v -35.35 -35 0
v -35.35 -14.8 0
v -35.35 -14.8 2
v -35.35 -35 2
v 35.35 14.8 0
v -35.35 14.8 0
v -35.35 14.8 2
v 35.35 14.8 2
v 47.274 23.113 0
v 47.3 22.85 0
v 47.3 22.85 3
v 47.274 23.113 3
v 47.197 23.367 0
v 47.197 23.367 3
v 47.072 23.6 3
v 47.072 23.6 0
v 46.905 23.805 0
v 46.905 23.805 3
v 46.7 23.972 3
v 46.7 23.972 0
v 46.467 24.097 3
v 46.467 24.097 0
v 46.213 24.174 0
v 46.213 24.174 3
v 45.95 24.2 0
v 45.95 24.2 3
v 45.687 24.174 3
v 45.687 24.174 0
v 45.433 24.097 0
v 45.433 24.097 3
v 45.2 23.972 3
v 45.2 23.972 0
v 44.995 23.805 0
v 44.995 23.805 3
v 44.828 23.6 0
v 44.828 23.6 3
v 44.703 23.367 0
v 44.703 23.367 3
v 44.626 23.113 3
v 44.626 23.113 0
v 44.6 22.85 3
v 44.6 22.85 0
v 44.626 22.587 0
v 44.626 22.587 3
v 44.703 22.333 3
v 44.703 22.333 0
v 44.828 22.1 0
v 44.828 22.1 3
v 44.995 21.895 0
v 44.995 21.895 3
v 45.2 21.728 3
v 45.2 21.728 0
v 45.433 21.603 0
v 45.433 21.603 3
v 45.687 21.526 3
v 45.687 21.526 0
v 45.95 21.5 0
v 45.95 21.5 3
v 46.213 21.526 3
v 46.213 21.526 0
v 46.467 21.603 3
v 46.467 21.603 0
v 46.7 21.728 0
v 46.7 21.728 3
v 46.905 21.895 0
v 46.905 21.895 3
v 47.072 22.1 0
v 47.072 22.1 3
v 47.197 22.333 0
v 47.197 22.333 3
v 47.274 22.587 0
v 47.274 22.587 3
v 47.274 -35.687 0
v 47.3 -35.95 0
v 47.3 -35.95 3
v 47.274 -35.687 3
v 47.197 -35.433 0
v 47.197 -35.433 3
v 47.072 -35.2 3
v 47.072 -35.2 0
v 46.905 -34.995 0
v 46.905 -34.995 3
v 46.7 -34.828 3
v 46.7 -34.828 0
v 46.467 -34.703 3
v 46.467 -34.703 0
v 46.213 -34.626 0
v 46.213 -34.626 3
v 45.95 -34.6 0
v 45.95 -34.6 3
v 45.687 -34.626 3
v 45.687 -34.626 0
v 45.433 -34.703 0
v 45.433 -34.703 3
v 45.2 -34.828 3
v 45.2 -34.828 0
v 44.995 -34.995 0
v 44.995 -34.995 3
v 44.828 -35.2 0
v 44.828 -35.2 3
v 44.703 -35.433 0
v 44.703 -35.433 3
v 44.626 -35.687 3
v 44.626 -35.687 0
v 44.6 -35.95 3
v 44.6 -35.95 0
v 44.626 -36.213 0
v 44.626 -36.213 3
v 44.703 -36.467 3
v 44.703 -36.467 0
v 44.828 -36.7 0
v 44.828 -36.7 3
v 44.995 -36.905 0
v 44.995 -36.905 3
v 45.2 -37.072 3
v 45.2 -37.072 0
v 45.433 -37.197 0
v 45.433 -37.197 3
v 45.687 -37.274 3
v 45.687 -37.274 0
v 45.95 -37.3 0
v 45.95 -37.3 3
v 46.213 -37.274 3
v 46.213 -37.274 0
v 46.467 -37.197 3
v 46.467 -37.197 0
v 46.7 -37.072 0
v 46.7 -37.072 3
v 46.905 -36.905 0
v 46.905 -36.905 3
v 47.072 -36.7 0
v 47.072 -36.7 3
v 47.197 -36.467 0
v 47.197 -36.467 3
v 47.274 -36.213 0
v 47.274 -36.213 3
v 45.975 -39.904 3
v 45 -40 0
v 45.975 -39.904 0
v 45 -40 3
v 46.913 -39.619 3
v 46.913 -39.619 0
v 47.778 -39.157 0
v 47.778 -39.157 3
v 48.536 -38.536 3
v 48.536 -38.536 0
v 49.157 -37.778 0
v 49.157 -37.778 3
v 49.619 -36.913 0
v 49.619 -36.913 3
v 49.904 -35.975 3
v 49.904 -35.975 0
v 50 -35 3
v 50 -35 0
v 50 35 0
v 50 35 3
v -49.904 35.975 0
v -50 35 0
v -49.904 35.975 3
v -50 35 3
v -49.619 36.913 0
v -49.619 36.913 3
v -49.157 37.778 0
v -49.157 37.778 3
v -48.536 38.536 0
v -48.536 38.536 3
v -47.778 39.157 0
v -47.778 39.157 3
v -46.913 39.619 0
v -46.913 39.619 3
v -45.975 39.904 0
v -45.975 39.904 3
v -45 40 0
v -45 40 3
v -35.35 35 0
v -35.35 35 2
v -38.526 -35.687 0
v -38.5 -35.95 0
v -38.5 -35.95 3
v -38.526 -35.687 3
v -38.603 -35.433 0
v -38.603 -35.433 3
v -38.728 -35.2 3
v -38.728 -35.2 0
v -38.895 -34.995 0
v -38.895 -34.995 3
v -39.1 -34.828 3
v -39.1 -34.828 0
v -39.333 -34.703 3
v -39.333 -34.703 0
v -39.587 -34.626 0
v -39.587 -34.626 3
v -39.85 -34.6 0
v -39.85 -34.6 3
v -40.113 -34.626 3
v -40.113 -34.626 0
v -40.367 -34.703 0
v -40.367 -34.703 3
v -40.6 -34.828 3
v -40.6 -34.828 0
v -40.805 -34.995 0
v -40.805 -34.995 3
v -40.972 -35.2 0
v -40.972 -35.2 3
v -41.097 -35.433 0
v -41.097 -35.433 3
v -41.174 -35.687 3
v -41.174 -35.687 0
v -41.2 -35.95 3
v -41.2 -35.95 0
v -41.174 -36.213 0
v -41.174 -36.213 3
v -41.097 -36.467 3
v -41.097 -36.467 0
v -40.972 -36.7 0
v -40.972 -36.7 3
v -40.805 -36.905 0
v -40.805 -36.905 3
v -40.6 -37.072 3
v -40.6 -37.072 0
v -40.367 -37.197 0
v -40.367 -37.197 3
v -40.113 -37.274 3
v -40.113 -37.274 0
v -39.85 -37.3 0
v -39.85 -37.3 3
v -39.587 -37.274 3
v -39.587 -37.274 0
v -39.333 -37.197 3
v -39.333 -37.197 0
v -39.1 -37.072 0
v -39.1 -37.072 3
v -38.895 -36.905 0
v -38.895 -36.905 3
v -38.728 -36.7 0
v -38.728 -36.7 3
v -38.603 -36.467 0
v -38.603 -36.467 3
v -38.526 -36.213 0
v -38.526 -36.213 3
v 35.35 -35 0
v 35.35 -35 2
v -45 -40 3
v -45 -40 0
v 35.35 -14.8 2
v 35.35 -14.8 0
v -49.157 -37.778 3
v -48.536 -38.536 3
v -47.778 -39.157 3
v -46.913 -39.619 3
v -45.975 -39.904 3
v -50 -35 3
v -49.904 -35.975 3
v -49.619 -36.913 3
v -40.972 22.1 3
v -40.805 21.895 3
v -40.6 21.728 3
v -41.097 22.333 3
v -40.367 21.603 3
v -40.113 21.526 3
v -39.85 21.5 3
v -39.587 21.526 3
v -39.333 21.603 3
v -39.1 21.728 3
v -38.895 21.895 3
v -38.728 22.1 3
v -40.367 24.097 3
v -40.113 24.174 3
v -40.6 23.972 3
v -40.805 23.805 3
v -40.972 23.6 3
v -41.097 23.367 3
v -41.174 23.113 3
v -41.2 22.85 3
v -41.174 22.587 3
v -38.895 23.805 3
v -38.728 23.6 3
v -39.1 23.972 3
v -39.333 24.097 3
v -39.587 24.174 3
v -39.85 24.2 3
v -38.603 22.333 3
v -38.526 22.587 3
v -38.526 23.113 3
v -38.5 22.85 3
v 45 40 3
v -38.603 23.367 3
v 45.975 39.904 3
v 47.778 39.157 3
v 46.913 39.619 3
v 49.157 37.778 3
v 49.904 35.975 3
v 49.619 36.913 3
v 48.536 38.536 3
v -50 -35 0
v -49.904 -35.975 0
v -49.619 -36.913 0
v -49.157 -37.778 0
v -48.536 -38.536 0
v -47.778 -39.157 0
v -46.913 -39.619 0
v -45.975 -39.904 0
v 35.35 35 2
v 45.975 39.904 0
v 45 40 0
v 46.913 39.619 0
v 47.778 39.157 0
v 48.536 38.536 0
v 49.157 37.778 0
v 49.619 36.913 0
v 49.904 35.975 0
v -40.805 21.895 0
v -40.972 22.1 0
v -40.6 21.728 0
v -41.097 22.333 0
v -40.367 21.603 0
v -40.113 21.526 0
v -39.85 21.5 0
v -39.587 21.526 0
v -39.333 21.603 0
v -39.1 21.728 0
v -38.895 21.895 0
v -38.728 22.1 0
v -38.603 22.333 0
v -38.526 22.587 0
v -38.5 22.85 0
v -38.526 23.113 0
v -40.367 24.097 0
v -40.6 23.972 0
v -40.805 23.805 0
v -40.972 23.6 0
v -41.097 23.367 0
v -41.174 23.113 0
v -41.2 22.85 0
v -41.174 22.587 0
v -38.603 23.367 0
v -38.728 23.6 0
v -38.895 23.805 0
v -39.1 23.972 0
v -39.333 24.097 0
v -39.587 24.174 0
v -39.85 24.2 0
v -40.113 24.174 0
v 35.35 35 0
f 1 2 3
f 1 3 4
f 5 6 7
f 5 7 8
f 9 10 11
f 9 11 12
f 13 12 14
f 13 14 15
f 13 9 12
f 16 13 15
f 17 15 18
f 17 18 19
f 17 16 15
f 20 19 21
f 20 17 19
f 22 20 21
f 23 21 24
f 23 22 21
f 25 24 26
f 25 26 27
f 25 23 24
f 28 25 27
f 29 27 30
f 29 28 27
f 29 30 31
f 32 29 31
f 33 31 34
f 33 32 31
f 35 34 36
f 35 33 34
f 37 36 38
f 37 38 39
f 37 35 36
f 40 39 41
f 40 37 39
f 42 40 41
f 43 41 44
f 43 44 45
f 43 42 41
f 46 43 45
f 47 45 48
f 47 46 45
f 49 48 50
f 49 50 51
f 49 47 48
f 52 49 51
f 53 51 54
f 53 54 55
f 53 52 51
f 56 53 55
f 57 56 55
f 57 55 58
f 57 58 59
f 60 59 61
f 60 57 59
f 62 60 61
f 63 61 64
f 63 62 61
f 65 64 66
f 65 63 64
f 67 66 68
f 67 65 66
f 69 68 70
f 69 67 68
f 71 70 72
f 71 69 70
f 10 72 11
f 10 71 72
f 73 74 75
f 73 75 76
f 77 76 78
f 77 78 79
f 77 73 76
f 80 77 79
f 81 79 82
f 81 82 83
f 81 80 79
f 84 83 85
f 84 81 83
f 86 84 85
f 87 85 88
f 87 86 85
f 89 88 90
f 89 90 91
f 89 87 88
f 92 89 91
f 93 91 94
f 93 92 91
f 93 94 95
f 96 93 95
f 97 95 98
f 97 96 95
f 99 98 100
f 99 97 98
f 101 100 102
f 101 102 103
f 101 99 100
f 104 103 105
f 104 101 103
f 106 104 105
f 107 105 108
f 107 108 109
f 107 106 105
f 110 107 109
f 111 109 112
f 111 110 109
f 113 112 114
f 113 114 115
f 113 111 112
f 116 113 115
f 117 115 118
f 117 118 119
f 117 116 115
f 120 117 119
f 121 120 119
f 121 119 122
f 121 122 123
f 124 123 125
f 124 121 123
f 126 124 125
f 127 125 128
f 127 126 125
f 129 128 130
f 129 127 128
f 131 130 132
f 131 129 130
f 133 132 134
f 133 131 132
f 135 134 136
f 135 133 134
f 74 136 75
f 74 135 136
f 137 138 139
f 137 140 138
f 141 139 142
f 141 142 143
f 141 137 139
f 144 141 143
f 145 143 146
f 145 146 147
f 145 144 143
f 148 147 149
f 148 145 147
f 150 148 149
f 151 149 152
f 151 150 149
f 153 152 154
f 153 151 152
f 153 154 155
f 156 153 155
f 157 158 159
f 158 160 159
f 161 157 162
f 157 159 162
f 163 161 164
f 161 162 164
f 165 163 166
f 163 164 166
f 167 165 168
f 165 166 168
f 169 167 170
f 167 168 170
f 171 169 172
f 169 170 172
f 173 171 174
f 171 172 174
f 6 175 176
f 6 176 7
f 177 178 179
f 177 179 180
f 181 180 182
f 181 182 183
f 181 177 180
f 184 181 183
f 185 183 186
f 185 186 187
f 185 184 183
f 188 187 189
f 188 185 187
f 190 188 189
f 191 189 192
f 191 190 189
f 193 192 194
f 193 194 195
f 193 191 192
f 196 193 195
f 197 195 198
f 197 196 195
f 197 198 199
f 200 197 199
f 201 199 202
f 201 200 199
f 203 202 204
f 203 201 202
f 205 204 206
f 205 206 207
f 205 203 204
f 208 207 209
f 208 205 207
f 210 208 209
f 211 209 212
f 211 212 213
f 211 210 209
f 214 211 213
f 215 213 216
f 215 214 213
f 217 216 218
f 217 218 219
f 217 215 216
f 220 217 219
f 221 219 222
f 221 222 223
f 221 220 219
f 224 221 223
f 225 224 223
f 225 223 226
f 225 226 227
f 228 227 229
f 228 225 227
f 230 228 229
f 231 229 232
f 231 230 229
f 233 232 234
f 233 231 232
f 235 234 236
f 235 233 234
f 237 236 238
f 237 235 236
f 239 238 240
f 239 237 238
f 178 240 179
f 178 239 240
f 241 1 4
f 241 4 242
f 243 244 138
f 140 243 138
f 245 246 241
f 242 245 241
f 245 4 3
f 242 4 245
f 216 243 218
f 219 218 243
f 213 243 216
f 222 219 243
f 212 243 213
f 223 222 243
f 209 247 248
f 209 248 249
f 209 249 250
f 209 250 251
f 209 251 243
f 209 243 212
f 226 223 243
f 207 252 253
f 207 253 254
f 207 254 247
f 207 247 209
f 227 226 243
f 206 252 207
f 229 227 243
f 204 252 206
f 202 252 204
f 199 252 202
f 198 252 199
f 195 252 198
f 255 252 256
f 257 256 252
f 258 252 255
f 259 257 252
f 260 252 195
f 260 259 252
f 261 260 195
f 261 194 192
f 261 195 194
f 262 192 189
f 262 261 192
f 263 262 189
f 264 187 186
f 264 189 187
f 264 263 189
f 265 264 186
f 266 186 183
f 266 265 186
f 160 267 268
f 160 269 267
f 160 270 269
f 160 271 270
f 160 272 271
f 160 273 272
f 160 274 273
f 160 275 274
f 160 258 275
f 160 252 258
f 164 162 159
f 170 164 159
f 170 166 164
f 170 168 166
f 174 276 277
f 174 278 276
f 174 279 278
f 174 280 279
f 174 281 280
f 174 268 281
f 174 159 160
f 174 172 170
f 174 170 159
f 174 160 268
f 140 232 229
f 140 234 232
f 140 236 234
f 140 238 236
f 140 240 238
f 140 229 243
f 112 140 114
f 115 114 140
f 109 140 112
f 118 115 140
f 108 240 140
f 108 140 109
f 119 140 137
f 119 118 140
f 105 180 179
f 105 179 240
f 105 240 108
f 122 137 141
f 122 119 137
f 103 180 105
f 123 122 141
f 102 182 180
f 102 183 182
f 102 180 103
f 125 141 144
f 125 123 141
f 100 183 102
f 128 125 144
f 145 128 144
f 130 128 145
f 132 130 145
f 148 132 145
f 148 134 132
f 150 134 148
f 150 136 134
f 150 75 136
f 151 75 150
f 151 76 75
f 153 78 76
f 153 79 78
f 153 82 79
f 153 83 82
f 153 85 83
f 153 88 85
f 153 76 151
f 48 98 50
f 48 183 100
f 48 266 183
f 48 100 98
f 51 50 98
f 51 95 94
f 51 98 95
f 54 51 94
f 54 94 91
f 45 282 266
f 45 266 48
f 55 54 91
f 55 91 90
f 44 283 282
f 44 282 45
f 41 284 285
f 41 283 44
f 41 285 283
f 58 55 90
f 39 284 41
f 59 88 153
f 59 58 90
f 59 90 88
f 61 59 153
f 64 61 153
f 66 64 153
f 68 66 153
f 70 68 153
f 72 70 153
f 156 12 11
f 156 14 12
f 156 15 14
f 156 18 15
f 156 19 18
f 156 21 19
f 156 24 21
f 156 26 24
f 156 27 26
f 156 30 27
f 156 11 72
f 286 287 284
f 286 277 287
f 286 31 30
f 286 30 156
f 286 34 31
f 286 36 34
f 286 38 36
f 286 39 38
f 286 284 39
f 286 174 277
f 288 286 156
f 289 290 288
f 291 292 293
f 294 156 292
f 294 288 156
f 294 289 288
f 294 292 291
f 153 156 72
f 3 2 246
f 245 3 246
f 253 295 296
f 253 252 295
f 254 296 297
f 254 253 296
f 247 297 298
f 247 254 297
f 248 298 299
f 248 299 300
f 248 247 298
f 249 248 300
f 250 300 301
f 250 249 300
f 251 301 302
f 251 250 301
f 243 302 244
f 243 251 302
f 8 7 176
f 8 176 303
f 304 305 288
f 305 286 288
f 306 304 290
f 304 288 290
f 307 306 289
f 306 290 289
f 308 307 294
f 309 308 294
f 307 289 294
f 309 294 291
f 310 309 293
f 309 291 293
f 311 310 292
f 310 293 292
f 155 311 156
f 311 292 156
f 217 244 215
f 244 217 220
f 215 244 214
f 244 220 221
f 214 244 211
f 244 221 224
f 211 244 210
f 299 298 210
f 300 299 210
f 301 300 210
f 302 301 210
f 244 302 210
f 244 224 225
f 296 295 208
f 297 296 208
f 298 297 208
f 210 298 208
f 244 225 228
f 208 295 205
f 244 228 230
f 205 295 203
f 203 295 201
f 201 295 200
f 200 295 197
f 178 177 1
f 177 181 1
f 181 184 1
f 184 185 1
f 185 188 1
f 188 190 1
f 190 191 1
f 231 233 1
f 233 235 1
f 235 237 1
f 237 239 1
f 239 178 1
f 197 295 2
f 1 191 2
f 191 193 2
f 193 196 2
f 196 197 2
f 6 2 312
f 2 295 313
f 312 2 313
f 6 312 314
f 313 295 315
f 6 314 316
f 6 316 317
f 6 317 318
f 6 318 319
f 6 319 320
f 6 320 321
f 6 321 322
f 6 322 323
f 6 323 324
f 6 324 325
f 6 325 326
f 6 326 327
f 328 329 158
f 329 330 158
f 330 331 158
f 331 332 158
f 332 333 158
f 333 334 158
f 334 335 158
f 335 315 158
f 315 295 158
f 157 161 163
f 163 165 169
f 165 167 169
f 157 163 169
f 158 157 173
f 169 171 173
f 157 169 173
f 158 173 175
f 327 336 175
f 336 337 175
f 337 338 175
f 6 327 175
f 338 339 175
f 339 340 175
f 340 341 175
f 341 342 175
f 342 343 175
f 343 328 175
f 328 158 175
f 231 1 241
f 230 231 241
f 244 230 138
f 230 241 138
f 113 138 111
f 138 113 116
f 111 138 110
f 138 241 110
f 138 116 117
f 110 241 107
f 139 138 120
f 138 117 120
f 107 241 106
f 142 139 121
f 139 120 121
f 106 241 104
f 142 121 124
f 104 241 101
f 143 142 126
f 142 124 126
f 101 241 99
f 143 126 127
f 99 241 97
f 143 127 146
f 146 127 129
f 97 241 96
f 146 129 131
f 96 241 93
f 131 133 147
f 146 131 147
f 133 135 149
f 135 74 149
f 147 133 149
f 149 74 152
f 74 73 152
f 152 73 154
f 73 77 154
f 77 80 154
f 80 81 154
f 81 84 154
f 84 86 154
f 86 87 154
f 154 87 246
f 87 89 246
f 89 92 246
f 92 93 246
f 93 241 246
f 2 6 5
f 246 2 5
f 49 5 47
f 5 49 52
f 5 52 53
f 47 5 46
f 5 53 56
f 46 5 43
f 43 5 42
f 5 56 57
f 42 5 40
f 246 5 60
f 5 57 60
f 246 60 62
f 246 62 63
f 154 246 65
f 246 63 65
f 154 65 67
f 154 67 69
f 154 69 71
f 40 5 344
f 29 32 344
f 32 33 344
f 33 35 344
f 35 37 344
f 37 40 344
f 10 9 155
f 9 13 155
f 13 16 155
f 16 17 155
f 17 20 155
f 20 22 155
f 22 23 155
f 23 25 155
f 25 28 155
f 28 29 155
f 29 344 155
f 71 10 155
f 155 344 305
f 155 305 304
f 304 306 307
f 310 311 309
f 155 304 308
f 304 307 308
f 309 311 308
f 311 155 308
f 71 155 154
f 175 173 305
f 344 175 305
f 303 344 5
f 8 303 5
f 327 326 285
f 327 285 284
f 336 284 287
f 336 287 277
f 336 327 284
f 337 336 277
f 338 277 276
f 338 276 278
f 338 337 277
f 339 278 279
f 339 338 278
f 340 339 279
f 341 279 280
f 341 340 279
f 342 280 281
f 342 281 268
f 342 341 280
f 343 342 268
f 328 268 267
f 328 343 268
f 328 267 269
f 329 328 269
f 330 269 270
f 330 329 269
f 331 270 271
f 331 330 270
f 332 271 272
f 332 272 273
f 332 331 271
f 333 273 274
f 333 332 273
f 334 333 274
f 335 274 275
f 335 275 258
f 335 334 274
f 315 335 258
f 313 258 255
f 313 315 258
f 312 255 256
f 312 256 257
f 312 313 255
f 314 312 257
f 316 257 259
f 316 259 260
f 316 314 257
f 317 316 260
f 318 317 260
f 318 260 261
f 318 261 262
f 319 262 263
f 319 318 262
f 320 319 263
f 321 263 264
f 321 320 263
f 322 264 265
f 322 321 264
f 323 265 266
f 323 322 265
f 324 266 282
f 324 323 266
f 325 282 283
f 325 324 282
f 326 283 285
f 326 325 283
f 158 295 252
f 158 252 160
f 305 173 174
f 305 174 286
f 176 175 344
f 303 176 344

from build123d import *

# Parameters (mm, degrees)
SKETCH_W     = 100
SKETCH_H     = 80
SKETCH_R     = 1.35
PAD_DEPTH    = 3
SKETCH001_W  = 70.7
SKETCH001_H  = 20.2
POCKET_DEPTH = 2
FILLET_R     = 5


with BuildPart() as part:
    # Sketch → Pad (new body)
    with BuildSketch(Plane.XY):
        Rectangle(SKETCH_W, SKETCH_H)
        with Locations((-39.85, 22.85)):
            Circle(SKETCH_R, mode=Mode.SUBTRACT)
        with Locations((45.95, 22.85)):
            Circle(SKETCH_R, mode=Mode.SUBTRACT)
        with Locations((-39.85, -35.95)):
            Circle(SKETCH_R, mode=Mode.SUBTRACT)
        with Locations((45.95, -35.95)):
            Circle(SKETCH_R, mode=Mode.SUBTRACT)
    extrude(amount=PAD_DEPTH)

    # Sketch001 (on Face9 of Pad) → Pocket (cut)
    with BuildSketch(Plane(origin=(0, 0, 0), x_dir=(1, 0, 0), z_dir=(0, 0, -1))):
        with Locations((0, 24.9)):
            Rectangle(SKETCH001_W, SKETCH001_H)
        with Locations((0, -24.9)):
            Rectangle(SKETCH001_W, SKETCH001_H)
    extrude(amount=-POCKET_DEPTH, mode=Mode.SUBTRACT)

    # Fillet
    fillet_edges = [part.edges().sort_by_distance(p)[0] for p in [
        (-50, 40, 1.5),
        (50, 40, 1.5),
        (-50, -40, 1.5),
        (50, -40, 1.5),
    ]]
    fillet(fillet_edges, radius=FILLET_R)


solid = part.part
